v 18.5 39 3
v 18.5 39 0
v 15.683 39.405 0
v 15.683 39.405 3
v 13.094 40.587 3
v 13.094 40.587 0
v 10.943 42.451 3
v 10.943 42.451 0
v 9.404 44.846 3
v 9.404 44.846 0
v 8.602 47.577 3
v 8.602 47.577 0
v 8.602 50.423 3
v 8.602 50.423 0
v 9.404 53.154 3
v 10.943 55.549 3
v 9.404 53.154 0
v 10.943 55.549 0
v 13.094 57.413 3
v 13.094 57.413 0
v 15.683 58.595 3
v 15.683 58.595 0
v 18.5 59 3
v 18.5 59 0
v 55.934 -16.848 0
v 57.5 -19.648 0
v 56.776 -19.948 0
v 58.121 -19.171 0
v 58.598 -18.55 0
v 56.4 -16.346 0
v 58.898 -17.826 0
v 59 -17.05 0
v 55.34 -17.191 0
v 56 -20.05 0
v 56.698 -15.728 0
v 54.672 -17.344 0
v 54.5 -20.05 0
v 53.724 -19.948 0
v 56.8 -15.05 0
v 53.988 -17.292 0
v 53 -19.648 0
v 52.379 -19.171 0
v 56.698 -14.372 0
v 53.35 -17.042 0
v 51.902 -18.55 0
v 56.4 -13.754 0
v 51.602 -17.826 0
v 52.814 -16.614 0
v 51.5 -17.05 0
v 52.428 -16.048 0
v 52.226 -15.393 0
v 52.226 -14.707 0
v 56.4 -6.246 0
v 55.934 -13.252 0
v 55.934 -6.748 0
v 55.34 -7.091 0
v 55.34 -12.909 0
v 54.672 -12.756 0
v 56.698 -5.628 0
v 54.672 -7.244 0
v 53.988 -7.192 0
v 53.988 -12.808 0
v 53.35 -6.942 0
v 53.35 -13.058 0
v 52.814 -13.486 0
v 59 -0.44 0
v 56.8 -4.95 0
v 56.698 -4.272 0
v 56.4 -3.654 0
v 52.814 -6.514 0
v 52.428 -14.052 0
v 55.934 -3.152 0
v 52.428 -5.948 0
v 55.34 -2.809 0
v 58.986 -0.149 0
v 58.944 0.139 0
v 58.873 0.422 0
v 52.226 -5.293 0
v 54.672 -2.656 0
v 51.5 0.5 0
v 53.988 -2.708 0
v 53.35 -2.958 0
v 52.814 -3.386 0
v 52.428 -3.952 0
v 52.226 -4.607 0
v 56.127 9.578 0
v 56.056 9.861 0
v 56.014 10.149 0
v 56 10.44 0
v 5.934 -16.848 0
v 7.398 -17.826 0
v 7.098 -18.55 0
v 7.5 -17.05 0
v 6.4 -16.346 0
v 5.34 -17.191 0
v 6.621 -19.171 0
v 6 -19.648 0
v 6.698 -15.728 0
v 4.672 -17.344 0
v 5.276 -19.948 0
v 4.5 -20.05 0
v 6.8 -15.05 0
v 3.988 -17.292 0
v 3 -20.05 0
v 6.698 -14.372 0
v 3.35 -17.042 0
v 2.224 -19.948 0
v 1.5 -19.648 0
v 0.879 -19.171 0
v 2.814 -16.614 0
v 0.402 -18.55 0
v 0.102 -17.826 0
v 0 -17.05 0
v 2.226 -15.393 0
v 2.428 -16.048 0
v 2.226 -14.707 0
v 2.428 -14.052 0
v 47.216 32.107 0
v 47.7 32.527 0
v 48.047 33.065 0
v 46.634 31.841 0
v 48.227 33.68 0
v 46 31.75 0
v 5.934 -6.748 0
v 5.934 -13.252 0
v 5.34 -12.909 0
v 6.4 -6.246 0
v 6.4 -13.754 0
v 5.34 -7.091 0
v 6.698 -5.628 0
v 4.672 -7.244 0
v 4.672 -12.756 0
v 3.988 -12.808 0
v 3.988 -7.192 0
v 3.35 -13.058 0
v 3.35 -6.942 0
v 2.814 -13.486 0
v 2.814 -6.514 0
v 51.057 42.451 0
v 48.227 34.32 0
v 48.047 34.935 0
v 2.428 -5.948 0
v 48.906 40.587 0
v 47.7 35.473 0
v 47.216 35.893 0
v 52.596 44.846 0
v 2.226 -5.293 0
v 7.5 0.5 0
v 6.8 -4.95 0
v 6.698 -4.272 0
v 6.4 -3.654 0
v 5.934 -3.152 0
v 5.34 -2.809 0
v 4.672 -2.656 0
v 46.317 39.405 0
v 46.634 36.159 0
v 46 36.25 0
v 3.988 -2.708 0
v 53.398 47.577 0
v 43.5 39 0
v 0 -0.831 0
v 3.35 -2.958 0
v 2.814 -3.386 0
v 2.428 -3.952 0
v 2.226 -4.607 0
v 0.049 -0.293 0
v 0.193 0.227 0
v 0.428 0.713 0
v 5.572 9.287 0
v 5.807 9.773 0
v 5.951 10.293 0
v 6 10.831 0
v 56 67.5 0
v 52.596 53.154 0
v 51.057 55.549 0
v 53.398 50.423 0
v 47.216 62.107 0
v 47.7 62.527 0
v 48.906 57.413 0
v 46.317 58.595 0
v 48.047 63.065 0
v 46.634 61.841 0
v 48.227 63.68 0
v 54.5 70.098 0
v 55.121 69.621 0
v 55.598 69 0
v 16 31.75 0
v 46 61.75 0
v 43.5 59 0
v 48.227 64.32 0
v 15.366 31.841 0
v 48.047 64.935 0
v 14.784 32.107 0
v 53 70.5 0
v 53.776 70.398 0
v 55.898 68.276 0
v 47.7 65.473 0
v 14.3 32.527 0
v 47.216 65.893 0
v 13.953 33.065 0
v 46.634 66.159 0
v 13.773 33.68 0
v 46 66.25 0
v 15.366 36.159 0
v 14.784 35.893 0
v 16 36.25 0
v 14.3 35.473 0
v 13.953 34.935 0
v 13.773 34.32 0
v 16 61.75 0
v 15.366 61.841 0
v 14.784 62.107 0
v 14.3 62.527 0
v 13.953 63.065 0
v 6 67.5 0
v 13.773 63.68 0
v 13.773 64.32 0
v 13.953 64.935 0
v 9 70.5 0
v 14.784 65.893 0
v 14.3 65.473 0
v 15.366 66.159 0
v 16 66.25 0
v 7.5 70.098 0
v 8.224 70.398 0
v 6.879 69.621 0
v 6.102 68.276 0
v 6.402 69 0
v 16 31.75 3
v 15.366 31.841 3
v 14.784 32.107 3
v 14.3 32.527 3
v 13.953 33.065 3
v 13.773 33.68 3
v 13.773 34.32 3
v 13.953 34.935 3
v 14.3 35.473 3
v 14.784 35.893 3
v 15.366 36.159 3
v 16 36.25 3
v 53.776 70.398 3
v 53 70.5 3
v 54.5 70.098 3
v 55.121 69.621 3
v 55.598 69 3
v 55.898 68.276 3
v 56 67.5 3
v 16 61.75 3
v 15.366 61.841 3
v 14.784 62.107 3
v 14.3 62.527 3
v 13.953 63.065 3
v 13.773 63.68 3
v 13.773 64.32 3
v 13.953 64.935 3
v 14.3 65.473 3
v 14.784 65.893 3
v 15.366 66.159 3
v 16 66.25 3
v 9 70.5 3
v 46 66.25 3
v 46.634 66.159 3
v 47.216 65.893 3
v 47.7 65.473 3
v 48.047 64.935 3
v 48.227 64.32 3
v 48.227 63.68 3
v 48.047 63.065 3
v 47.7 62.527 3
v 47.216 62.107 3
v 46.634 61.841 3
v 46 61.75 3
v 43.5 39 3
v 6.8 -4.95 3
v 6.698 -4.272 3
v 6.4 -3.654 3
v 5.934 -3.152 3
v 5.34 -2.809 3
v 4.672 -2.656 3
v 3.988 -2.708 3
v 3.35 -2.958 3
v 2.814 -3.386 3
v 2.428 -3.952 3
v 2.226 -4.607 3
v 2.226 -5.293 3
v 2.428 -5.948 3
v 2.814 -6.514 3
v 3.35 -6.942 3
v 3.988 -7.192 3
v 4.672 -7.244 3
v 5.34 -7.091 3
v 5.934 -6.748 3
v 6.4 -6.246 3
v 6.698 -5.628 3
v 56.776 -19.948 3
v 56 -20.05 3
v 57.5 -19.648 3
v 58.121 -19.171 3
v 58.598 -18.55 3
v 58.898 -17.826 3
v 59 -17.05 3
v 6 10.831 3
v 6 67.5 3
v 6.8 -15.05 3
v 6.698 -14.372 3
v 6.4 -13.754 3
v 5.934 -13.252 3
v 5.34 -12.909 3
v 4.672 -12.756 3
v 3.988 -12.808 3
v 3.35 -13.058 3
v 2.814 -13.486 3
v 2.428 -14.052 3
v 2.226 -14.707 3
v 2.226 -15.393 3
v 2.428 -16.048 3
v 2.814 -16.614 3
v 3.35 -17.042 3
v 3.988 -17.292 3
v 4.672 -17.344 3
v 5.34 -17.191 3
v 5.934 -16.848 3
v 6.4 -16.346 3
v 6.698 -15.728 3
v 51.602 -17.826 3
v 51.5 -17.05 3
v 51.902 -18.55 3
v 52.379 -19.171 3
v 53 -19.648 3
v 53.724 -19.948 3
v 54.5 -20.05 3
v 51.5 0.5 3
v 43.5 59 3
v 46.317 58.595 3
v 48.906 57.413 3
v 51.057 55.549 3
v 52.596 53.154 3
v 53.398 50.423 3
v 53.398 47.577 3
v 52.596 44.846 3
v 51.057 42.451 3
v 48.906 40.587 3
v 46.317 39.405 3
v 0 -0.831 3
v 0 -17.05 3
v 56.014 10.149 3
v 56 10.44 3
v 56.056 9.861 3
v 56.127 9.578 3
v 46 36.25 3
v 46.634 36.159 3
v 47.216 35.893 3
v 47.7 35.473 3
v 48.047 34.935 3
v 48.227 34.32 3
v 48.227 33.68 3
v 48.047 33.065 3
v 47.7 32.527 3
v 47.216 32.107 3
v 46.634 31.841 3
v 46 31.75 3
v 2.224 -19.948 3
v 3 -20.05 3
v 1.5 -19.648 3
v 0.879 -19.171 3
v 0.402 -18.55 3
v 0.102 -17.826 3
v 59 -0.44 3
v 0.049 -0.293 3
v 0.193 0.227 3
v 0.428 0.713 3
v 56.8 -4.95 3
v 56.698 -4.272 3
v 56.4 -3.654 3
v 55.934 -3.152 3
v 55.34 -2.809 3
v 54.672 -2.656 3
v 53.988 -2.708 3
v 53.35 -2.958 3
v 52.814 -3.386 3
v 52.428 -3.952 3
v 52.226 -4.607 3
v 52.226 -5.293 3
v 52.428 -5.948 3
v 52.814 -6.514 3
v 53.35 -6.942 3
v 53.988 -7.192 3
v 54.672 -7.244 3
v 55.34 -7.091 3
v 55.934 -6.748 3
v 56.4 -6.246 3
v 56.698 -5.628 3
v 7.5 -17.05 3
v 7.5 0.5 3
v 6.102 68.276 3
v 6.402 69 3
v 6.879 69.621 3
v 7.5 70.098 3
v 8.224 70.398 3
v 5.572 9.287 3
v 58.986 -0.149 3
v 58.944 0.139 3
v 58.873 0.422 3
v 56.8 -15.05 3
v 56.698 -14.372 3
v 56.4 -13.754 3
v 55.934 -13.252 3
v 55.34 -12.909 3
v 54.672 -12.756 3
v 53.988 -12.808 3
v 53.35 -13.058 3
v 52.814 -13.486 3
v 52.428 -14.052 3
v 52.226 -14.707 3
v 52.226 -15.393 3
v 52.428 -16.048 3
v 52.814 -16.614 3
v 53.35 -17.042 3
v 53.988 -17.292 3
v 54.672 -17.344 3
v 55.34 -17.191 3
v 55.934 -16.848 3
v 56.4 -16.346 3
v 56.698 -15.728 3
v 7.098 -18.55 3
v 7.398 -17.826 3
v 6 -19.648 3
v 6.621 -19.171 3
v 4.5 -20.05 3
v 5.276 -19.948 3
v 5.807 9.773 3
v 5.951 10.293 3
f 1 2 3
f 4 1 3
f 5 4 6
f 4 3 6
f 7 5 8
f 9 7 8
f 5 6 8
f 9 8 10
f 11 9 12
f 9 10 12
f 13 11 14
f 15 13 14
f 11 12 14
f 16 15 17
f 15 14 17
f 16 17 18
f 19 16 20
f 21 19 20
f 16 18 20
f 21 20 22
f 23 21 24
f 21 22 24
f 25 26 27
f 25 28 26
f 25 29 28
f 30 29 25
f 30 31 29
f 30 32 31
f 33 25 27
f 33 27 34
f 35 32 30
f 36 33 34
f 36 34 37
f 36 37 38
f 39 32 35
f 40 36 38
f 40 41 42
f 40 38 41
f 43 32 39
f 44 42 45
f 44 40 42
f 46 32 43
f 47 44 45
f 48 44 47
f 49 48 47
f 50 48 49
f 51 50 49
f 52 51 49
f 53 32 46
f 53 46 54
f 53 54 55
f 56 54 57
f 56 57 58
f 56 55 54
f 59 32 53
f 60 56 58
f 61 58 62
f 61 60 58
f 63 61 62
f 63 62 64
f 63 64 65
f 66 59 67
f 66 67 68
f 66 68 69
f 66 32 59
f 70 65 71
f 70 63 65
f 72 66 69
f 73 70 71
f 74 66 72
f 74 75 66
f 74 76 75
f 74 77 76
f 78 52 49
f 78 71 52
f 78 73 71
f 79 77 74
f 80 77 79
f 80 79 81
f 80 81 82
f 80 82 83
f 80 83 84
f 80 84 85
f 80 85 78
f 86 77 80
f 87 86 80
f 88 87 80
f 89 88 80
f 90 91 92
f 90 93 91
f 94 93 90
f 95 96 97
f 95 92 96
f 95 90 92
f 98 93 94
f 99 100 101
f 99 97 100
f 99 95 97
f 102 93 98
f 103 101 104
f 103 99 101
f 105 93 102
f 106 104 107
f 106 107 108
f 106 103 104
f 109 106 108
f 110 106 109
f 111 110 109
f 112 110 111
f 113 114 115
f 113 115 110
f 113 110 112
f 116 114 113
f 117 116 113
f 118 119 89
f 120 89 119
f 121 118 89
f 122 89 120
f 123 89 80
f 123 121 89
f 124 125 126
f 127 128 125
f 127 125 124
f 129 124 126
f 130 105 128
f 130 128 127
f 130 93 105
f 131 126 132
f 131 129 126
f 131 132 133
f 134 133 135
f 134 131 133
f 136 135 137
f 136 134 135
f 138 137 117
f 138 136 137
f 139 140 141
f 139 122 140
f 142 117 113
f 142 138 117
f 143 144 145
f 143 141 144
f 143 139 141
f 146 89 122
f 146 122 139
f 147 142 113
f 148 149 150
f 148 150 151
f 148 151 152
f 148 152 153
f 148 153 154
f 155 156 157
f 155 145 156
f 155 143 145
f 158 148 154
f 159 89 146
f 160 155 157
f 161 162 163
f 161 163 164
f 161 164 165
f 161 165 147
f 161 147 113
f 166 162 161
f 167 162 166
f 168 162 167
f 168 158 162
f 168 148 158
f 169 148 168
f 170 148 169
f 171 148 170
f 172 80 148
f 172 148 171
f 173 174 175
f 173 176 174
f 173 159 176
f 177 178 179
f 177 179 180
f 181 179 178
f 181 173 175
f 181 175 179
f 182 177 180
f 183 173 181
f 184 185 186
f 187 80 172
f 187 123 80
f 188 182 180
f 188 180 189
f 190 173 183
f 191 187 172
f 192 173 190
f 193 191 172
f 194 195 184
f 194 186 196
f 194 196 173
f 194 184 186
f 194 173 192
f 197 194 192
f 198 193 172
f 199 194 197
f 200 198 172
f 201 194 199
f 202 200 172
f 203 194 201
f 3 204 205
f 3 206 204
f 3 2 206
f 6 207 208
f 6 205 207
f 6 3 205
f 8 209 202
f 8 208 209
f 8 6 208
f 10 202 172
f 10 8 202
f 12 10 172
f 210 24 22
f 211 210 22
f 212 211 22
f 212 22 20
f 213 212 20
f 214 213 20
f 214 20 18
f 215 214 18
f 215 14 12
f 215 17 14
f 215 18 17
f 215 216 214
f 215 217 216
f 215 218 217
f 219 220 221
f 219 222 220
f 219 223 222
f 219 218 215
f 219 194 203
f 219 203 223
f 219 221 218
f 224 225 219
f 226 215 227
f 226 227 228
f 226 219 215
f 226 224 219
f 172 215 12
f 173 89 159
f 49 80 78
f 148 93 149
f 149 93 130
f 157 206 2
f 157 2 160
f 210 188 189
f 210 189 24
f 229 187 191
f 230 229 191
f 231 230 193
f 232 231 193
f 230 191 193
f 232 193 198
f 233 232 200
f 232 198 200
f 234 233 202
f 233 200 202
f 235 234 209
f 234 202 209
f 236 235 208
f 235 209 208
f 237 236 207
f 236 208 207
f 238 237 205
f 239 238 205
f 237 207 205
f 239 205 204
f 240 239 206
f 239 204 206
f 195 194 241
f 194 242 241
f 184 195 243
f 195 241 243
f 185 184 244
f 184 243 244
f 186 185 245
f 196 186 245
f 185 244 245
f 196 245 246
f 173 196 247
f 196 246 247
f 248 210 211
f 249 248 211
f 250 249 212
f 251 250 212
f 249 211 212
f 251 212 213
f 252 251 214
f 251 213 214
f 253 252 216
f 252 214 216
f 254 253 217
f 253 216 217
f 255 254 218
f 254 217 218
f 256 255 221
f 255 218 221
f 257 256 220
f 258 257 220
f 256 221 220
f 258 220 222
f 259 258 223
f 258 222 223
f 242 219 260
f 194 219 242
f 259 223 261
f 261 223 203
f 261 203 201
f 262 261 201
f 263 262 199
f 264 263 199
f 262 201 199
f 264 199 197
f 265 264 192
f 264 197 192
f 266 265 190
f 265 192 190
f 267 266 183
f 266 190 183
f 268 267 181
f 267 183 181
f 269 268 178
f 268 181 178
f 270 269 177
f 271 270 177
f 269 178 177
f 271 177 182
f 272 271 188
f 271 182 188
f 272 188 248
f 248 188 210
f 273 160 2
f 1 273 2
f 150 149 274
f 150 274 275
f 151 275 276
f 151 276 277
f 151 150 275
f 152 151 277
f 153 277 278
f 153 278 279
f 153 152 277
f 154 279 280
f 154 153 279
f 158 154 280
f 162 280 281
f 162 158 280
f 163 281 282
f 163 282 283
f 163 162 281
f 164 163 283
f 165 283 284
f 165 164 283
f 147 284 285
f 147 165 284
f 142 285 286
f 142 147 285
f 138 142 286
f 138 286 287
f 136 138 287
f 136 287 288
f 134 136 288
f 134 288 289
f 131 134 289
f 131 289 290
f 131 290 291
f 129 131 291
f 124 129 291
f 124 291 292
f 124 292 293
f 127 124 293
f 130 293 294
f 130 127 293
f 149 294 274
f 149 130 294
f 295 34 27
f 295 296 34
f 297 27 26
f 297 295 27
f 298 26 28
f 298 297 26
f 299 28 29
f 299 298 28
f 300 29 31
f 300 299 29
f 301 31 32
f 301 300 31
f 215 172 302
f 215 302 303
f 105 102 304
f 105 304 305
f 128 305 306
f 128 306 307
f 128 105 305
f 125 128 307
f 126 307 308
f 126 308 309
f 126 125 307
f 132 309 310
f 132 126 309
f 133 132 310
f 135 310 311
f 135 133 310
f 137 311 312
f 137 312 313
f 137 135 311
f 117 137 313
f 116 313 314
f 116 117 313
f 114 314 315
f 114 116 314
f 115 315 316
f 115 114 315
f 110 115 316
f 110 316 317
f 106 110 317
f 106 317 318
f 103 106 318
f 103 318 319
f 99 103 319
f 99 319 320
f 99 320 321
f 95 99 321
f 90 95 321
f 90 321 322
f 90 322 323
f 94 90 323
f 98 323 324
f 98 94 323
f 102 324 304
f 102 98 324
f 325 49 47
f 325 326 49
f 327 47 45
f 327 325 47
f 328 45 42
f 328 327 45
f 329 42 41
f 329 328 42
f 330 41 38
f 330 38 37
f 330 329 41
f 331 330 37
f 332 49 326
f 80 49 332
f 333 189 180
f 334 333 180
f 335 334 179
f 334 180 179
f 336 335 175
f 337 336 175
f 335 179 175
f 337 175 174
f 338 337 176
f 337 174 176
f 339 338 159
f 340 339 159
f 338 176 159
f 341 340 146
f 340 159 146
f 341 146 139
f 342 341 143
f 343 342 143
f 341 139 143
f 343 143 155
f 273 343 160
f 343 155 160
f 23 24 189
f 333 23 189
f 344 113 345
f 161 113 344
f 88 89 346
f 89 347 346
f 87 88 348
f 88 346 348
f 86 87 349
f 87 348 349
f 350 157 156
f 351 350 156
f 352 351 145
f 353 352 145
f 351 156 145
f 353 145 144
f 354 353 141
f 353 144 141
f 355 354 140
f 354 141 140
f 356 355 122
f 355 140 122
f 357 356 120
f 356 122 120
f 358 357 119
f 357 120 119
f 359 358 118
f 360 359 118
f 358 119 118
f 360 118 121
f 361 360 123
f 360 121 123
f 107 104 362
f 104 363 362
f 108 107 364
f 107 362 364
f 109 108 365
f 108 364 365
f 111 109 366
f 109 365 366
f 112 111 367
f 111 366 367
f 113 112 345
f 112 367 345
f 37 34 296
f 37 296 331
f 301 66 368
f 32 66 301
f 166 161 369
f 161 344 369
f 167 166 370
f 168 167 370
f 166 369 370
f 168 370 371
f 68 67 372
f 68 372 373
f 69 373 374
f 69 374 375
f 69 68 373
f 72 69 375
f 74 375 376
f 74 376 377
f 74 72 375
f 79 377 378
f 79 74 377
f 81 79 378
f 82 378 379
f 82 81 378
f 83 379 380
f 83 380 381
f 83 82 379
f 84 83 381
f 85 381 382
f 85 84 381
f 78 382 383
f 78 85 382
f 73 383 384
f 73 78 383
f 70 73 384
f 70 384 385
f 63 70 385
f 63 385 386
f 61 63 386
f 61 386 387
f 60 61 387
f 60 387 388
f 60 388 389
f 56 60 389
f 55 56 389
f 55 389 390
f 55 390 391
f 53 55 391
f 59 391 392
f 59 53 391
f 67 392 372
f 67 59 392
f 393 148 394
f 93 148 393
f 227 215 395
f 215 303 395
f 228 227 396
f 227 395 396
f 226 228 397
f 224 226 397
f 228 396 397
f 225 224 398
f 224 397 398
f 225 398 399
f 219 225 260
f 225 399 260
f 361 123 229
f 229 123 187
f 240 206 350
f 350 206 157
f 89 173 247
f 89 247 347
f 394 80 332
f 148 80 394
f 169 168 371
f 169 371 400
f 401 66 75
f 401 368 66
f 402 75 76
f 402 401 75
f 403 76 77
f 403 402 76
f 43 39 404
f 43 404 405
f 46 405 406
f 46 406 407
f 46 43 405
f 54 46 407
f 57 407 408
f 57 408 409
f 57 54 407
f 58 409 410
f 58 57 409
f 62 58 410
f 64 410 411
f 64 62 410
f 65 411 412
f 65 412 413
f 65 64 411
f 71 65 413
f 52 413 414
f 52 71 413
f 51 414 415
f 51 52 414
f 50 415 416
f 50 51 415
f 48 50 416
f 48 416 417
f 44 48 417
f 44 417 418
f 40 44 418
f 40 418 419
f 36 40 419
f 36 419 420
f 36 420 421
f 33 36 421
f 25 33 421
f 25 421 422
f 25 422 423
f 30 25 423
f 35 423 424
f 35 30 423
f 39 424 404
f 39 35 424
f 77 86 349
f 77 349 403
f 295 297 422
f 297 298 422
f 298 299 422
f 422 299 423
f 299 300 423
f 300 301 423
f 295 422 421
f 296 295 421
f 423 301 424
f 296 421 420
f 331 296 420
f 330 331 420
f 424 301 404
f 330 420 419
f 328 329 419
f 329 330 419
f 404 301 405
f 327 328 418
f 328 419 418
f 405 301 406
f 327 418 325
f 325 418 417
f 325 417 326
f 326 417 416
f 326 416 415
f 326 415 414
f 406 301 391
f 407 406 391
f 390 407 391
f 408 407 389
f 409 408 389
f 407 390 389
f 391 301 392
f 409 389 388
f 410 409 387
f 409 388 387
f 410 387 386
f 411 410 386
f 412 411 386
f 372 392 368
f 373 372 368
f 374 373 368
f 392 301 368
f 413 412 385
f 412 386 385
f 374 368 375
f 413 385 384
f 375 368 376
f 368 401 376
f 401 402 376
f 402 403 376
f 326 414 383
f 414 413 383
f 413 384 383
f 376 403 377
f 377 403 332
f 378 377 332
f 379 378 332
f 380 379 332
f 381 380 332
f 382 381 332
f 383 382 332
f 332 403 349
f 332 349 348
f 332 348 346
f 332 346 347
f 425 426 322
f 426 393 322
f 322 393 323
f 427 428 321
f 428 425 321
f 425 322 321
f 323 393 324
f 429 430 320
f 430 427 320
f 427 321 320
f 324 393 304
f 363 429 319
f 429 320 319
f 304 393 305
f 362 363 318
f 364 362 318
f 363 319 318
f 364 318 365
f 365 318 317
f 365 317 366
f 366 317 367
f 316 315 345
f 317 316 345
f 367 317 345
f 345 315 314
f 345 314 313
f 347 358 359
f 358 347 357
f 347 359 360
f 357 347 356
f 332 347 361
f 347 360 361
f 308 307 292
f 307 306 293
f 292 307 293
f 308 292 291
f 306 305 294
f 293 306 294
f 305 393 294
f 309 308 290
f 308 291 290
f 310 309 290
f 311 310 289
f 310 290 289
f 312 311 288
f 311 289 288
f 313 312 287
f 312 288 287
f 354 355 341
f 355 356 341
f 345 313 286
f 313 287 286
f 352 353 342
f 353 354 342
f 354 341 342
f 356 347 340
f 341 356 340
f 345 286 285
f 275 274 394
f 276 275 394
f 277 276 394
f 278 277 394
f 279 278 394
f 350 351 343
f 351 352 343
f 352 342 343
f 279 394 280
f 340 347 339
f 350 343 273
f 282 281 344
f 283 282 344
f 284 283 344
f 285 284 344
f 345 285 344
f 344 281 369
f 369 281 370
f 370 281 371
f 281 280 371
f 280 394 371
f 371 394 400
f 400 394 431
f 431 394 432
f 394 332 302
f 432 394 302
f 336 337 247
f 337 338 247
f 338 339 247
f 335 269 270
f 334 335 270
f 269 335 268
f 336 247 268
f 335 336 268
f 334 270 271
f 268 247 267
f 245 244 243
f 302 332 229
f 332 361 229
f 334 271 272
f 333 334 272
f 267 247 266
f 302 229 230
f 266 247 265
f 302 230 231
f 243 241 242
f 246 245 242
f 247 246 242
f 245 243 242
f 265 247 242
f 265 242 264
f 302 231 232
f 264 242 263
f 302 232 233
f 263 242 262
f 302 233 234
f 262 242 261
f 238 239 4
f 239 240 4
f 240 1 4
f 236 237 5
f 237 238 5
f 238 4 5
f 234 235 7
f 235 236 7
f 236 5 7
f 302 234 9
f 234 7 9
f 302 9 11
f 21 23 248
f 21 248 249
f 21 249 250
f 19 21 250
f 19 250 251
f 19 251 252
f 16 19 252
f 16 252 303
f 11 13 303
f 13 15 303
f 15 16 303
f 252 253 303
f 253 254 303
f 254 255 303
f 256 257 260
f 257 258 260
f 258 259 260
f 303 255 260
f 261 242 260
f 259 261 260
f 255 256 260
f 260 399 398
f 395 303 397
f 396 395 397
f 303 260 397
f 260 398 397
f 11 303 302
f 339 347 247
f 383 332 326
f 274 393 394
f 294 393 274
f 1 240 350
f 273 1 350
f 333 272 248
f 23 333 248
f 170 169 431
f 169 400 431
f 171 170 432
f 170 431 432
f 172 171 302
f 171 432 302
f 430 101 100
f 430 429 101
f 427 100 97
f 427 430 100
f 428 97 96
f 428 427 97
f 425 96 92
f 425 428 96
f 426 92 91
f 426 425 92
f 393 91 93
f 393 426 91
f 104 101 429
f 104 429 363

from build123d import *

# Parameters (mm, degrees)
SKETCH1_R           = 2.3
BOSS_EXTRUDE1_DEPTH = 3
FILLET1_R           = 3


with BuildPart() as part:
    # Sketch1 → Boss-Extrude1 (new body)
    with BuildSketch(Plane.XY):
        Polygon((7.5, -20.05), (0, -20.05), (0, 0), (6, 10), (6, 70.5), (56, 70.5), (56, 10), (59, 0), (59, -20.05), (51.5, -20.05), (51.5, 0.5), (7.5, 0.5), align=None)
        with Locations((4.5, -15.05)):
            Circle(SKETCH1_R, mode=Mode.SUBTRACT)
        with Locations((4.5, -4.95)):
            Circle(SKETCH1_R, mode=Mode.SUBTRACT)
        with Locations((54.5, -15.05)):
            Circle(SKETCH1_R, mode=Mode.SUBTRACT)
        with Locations((54.5, -4.95)):
            Circle(SKETCH1_R, mode=Mode.SUBTRACT)
        with BuildLine():
            Line((18.5, 59), (43.5, 59))
            ThreePointArc((43.5, 59), (53.5, 49), (43.5, 39))
            Line((43.5, 39), (18.5, 39))
            ThreePointArc((18.5, 39), (8.5, 49), (18.5, 59))
        make_face(mode=Mode.SUBTRACT)
        with BuildLine():
            Line((16, 66.25), (46, 66.25))
            ThreePointArc((46, 66.25), (48.25, 64), (46, 61.75))
            Line((46, 61.75), (16, 61.75))
            ThreePointArc((16, 61.75), (13.75, 64), (16, 66.25))
        make_face(mode=Mode.SUBTRACT)
        with BuildLine():
            Line((16, 36.25), (46, 36.25))
            ThreePointArc((46, 36.25), (48.25, 34), (46, 31.75))
            Line((46, 31.75), (16, 31.75))
            ThreePointArc((16, 31.75), (13.75, 34), (16, 36.25))
        make_face(mode=Mode.SUBTRACT)
    extrude(amount=BOSS_EXTRUDE1_DEPTH)

    # Fillet1
    fillet1_edges = [part.edges().sort_by_distance(p)[0] for p in [
        (0, 0, 1.5),
        (6, 10, 1.5),
        (6, 70.5, 1.5),
        (56, 70.5, 1.5),
        (56, 10, 1.5),
        (59, 0, 1.5),
        (59, -20.05, 1.5),
        (51.5, -20.05, 1.5),
        (7.5, -20.05, 1.5),
        (0, -20.05, 1.5),
    ]]
    fillet(fillet1_edges, radius=FILLET1_R)


solid = part.part
